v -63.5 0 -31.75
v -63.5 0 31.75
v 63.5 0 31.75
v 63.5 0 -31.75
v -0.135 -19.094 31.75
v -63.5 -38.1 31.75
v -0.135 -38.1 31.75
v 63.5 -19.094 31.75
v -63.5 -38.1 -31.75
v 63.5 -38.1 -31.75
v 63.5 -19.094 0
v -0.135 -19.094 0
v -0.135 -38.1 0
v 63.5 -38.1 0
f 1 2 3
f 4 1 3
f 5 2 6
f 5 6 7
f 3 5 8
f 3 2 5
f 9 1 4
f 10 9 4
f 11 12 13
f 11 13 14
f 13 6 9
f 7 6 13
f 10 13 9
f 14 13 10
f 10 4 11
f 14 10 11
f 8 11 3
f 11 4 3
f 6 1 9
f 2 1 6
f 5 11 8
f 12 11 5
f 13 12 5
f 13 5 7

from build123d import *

# Parameters (mm, degrees)
F0_W     = 127
F0_H     = 63.5
F1_DEPTH = 38.1
F3_DEPTH = 60.96


with BuildPart() as f1:
    # F0 (on Front) → F1 (new body)
    with BuildSketch(Plane.XZ):
        Rectangle(F0_W, F0_H)
    extrude(amount=F1_DEPTH)

    # F2 (on Top) → F3 (cut)
    with BuildSketch(Plane.XY):
        Polygon((-0.134974, -19.093526), (-0.134974, -35.547902), (-0.134974, -38.143526), (63.365026, -38.143526), (74.700989, -38.143526), (74.700989, -19.093526), (63.365026, -19.093526), align=None)
    extrude(amount=F3_DEPTH, mode=Mode.SUBTRACT)


solid = f1.part
